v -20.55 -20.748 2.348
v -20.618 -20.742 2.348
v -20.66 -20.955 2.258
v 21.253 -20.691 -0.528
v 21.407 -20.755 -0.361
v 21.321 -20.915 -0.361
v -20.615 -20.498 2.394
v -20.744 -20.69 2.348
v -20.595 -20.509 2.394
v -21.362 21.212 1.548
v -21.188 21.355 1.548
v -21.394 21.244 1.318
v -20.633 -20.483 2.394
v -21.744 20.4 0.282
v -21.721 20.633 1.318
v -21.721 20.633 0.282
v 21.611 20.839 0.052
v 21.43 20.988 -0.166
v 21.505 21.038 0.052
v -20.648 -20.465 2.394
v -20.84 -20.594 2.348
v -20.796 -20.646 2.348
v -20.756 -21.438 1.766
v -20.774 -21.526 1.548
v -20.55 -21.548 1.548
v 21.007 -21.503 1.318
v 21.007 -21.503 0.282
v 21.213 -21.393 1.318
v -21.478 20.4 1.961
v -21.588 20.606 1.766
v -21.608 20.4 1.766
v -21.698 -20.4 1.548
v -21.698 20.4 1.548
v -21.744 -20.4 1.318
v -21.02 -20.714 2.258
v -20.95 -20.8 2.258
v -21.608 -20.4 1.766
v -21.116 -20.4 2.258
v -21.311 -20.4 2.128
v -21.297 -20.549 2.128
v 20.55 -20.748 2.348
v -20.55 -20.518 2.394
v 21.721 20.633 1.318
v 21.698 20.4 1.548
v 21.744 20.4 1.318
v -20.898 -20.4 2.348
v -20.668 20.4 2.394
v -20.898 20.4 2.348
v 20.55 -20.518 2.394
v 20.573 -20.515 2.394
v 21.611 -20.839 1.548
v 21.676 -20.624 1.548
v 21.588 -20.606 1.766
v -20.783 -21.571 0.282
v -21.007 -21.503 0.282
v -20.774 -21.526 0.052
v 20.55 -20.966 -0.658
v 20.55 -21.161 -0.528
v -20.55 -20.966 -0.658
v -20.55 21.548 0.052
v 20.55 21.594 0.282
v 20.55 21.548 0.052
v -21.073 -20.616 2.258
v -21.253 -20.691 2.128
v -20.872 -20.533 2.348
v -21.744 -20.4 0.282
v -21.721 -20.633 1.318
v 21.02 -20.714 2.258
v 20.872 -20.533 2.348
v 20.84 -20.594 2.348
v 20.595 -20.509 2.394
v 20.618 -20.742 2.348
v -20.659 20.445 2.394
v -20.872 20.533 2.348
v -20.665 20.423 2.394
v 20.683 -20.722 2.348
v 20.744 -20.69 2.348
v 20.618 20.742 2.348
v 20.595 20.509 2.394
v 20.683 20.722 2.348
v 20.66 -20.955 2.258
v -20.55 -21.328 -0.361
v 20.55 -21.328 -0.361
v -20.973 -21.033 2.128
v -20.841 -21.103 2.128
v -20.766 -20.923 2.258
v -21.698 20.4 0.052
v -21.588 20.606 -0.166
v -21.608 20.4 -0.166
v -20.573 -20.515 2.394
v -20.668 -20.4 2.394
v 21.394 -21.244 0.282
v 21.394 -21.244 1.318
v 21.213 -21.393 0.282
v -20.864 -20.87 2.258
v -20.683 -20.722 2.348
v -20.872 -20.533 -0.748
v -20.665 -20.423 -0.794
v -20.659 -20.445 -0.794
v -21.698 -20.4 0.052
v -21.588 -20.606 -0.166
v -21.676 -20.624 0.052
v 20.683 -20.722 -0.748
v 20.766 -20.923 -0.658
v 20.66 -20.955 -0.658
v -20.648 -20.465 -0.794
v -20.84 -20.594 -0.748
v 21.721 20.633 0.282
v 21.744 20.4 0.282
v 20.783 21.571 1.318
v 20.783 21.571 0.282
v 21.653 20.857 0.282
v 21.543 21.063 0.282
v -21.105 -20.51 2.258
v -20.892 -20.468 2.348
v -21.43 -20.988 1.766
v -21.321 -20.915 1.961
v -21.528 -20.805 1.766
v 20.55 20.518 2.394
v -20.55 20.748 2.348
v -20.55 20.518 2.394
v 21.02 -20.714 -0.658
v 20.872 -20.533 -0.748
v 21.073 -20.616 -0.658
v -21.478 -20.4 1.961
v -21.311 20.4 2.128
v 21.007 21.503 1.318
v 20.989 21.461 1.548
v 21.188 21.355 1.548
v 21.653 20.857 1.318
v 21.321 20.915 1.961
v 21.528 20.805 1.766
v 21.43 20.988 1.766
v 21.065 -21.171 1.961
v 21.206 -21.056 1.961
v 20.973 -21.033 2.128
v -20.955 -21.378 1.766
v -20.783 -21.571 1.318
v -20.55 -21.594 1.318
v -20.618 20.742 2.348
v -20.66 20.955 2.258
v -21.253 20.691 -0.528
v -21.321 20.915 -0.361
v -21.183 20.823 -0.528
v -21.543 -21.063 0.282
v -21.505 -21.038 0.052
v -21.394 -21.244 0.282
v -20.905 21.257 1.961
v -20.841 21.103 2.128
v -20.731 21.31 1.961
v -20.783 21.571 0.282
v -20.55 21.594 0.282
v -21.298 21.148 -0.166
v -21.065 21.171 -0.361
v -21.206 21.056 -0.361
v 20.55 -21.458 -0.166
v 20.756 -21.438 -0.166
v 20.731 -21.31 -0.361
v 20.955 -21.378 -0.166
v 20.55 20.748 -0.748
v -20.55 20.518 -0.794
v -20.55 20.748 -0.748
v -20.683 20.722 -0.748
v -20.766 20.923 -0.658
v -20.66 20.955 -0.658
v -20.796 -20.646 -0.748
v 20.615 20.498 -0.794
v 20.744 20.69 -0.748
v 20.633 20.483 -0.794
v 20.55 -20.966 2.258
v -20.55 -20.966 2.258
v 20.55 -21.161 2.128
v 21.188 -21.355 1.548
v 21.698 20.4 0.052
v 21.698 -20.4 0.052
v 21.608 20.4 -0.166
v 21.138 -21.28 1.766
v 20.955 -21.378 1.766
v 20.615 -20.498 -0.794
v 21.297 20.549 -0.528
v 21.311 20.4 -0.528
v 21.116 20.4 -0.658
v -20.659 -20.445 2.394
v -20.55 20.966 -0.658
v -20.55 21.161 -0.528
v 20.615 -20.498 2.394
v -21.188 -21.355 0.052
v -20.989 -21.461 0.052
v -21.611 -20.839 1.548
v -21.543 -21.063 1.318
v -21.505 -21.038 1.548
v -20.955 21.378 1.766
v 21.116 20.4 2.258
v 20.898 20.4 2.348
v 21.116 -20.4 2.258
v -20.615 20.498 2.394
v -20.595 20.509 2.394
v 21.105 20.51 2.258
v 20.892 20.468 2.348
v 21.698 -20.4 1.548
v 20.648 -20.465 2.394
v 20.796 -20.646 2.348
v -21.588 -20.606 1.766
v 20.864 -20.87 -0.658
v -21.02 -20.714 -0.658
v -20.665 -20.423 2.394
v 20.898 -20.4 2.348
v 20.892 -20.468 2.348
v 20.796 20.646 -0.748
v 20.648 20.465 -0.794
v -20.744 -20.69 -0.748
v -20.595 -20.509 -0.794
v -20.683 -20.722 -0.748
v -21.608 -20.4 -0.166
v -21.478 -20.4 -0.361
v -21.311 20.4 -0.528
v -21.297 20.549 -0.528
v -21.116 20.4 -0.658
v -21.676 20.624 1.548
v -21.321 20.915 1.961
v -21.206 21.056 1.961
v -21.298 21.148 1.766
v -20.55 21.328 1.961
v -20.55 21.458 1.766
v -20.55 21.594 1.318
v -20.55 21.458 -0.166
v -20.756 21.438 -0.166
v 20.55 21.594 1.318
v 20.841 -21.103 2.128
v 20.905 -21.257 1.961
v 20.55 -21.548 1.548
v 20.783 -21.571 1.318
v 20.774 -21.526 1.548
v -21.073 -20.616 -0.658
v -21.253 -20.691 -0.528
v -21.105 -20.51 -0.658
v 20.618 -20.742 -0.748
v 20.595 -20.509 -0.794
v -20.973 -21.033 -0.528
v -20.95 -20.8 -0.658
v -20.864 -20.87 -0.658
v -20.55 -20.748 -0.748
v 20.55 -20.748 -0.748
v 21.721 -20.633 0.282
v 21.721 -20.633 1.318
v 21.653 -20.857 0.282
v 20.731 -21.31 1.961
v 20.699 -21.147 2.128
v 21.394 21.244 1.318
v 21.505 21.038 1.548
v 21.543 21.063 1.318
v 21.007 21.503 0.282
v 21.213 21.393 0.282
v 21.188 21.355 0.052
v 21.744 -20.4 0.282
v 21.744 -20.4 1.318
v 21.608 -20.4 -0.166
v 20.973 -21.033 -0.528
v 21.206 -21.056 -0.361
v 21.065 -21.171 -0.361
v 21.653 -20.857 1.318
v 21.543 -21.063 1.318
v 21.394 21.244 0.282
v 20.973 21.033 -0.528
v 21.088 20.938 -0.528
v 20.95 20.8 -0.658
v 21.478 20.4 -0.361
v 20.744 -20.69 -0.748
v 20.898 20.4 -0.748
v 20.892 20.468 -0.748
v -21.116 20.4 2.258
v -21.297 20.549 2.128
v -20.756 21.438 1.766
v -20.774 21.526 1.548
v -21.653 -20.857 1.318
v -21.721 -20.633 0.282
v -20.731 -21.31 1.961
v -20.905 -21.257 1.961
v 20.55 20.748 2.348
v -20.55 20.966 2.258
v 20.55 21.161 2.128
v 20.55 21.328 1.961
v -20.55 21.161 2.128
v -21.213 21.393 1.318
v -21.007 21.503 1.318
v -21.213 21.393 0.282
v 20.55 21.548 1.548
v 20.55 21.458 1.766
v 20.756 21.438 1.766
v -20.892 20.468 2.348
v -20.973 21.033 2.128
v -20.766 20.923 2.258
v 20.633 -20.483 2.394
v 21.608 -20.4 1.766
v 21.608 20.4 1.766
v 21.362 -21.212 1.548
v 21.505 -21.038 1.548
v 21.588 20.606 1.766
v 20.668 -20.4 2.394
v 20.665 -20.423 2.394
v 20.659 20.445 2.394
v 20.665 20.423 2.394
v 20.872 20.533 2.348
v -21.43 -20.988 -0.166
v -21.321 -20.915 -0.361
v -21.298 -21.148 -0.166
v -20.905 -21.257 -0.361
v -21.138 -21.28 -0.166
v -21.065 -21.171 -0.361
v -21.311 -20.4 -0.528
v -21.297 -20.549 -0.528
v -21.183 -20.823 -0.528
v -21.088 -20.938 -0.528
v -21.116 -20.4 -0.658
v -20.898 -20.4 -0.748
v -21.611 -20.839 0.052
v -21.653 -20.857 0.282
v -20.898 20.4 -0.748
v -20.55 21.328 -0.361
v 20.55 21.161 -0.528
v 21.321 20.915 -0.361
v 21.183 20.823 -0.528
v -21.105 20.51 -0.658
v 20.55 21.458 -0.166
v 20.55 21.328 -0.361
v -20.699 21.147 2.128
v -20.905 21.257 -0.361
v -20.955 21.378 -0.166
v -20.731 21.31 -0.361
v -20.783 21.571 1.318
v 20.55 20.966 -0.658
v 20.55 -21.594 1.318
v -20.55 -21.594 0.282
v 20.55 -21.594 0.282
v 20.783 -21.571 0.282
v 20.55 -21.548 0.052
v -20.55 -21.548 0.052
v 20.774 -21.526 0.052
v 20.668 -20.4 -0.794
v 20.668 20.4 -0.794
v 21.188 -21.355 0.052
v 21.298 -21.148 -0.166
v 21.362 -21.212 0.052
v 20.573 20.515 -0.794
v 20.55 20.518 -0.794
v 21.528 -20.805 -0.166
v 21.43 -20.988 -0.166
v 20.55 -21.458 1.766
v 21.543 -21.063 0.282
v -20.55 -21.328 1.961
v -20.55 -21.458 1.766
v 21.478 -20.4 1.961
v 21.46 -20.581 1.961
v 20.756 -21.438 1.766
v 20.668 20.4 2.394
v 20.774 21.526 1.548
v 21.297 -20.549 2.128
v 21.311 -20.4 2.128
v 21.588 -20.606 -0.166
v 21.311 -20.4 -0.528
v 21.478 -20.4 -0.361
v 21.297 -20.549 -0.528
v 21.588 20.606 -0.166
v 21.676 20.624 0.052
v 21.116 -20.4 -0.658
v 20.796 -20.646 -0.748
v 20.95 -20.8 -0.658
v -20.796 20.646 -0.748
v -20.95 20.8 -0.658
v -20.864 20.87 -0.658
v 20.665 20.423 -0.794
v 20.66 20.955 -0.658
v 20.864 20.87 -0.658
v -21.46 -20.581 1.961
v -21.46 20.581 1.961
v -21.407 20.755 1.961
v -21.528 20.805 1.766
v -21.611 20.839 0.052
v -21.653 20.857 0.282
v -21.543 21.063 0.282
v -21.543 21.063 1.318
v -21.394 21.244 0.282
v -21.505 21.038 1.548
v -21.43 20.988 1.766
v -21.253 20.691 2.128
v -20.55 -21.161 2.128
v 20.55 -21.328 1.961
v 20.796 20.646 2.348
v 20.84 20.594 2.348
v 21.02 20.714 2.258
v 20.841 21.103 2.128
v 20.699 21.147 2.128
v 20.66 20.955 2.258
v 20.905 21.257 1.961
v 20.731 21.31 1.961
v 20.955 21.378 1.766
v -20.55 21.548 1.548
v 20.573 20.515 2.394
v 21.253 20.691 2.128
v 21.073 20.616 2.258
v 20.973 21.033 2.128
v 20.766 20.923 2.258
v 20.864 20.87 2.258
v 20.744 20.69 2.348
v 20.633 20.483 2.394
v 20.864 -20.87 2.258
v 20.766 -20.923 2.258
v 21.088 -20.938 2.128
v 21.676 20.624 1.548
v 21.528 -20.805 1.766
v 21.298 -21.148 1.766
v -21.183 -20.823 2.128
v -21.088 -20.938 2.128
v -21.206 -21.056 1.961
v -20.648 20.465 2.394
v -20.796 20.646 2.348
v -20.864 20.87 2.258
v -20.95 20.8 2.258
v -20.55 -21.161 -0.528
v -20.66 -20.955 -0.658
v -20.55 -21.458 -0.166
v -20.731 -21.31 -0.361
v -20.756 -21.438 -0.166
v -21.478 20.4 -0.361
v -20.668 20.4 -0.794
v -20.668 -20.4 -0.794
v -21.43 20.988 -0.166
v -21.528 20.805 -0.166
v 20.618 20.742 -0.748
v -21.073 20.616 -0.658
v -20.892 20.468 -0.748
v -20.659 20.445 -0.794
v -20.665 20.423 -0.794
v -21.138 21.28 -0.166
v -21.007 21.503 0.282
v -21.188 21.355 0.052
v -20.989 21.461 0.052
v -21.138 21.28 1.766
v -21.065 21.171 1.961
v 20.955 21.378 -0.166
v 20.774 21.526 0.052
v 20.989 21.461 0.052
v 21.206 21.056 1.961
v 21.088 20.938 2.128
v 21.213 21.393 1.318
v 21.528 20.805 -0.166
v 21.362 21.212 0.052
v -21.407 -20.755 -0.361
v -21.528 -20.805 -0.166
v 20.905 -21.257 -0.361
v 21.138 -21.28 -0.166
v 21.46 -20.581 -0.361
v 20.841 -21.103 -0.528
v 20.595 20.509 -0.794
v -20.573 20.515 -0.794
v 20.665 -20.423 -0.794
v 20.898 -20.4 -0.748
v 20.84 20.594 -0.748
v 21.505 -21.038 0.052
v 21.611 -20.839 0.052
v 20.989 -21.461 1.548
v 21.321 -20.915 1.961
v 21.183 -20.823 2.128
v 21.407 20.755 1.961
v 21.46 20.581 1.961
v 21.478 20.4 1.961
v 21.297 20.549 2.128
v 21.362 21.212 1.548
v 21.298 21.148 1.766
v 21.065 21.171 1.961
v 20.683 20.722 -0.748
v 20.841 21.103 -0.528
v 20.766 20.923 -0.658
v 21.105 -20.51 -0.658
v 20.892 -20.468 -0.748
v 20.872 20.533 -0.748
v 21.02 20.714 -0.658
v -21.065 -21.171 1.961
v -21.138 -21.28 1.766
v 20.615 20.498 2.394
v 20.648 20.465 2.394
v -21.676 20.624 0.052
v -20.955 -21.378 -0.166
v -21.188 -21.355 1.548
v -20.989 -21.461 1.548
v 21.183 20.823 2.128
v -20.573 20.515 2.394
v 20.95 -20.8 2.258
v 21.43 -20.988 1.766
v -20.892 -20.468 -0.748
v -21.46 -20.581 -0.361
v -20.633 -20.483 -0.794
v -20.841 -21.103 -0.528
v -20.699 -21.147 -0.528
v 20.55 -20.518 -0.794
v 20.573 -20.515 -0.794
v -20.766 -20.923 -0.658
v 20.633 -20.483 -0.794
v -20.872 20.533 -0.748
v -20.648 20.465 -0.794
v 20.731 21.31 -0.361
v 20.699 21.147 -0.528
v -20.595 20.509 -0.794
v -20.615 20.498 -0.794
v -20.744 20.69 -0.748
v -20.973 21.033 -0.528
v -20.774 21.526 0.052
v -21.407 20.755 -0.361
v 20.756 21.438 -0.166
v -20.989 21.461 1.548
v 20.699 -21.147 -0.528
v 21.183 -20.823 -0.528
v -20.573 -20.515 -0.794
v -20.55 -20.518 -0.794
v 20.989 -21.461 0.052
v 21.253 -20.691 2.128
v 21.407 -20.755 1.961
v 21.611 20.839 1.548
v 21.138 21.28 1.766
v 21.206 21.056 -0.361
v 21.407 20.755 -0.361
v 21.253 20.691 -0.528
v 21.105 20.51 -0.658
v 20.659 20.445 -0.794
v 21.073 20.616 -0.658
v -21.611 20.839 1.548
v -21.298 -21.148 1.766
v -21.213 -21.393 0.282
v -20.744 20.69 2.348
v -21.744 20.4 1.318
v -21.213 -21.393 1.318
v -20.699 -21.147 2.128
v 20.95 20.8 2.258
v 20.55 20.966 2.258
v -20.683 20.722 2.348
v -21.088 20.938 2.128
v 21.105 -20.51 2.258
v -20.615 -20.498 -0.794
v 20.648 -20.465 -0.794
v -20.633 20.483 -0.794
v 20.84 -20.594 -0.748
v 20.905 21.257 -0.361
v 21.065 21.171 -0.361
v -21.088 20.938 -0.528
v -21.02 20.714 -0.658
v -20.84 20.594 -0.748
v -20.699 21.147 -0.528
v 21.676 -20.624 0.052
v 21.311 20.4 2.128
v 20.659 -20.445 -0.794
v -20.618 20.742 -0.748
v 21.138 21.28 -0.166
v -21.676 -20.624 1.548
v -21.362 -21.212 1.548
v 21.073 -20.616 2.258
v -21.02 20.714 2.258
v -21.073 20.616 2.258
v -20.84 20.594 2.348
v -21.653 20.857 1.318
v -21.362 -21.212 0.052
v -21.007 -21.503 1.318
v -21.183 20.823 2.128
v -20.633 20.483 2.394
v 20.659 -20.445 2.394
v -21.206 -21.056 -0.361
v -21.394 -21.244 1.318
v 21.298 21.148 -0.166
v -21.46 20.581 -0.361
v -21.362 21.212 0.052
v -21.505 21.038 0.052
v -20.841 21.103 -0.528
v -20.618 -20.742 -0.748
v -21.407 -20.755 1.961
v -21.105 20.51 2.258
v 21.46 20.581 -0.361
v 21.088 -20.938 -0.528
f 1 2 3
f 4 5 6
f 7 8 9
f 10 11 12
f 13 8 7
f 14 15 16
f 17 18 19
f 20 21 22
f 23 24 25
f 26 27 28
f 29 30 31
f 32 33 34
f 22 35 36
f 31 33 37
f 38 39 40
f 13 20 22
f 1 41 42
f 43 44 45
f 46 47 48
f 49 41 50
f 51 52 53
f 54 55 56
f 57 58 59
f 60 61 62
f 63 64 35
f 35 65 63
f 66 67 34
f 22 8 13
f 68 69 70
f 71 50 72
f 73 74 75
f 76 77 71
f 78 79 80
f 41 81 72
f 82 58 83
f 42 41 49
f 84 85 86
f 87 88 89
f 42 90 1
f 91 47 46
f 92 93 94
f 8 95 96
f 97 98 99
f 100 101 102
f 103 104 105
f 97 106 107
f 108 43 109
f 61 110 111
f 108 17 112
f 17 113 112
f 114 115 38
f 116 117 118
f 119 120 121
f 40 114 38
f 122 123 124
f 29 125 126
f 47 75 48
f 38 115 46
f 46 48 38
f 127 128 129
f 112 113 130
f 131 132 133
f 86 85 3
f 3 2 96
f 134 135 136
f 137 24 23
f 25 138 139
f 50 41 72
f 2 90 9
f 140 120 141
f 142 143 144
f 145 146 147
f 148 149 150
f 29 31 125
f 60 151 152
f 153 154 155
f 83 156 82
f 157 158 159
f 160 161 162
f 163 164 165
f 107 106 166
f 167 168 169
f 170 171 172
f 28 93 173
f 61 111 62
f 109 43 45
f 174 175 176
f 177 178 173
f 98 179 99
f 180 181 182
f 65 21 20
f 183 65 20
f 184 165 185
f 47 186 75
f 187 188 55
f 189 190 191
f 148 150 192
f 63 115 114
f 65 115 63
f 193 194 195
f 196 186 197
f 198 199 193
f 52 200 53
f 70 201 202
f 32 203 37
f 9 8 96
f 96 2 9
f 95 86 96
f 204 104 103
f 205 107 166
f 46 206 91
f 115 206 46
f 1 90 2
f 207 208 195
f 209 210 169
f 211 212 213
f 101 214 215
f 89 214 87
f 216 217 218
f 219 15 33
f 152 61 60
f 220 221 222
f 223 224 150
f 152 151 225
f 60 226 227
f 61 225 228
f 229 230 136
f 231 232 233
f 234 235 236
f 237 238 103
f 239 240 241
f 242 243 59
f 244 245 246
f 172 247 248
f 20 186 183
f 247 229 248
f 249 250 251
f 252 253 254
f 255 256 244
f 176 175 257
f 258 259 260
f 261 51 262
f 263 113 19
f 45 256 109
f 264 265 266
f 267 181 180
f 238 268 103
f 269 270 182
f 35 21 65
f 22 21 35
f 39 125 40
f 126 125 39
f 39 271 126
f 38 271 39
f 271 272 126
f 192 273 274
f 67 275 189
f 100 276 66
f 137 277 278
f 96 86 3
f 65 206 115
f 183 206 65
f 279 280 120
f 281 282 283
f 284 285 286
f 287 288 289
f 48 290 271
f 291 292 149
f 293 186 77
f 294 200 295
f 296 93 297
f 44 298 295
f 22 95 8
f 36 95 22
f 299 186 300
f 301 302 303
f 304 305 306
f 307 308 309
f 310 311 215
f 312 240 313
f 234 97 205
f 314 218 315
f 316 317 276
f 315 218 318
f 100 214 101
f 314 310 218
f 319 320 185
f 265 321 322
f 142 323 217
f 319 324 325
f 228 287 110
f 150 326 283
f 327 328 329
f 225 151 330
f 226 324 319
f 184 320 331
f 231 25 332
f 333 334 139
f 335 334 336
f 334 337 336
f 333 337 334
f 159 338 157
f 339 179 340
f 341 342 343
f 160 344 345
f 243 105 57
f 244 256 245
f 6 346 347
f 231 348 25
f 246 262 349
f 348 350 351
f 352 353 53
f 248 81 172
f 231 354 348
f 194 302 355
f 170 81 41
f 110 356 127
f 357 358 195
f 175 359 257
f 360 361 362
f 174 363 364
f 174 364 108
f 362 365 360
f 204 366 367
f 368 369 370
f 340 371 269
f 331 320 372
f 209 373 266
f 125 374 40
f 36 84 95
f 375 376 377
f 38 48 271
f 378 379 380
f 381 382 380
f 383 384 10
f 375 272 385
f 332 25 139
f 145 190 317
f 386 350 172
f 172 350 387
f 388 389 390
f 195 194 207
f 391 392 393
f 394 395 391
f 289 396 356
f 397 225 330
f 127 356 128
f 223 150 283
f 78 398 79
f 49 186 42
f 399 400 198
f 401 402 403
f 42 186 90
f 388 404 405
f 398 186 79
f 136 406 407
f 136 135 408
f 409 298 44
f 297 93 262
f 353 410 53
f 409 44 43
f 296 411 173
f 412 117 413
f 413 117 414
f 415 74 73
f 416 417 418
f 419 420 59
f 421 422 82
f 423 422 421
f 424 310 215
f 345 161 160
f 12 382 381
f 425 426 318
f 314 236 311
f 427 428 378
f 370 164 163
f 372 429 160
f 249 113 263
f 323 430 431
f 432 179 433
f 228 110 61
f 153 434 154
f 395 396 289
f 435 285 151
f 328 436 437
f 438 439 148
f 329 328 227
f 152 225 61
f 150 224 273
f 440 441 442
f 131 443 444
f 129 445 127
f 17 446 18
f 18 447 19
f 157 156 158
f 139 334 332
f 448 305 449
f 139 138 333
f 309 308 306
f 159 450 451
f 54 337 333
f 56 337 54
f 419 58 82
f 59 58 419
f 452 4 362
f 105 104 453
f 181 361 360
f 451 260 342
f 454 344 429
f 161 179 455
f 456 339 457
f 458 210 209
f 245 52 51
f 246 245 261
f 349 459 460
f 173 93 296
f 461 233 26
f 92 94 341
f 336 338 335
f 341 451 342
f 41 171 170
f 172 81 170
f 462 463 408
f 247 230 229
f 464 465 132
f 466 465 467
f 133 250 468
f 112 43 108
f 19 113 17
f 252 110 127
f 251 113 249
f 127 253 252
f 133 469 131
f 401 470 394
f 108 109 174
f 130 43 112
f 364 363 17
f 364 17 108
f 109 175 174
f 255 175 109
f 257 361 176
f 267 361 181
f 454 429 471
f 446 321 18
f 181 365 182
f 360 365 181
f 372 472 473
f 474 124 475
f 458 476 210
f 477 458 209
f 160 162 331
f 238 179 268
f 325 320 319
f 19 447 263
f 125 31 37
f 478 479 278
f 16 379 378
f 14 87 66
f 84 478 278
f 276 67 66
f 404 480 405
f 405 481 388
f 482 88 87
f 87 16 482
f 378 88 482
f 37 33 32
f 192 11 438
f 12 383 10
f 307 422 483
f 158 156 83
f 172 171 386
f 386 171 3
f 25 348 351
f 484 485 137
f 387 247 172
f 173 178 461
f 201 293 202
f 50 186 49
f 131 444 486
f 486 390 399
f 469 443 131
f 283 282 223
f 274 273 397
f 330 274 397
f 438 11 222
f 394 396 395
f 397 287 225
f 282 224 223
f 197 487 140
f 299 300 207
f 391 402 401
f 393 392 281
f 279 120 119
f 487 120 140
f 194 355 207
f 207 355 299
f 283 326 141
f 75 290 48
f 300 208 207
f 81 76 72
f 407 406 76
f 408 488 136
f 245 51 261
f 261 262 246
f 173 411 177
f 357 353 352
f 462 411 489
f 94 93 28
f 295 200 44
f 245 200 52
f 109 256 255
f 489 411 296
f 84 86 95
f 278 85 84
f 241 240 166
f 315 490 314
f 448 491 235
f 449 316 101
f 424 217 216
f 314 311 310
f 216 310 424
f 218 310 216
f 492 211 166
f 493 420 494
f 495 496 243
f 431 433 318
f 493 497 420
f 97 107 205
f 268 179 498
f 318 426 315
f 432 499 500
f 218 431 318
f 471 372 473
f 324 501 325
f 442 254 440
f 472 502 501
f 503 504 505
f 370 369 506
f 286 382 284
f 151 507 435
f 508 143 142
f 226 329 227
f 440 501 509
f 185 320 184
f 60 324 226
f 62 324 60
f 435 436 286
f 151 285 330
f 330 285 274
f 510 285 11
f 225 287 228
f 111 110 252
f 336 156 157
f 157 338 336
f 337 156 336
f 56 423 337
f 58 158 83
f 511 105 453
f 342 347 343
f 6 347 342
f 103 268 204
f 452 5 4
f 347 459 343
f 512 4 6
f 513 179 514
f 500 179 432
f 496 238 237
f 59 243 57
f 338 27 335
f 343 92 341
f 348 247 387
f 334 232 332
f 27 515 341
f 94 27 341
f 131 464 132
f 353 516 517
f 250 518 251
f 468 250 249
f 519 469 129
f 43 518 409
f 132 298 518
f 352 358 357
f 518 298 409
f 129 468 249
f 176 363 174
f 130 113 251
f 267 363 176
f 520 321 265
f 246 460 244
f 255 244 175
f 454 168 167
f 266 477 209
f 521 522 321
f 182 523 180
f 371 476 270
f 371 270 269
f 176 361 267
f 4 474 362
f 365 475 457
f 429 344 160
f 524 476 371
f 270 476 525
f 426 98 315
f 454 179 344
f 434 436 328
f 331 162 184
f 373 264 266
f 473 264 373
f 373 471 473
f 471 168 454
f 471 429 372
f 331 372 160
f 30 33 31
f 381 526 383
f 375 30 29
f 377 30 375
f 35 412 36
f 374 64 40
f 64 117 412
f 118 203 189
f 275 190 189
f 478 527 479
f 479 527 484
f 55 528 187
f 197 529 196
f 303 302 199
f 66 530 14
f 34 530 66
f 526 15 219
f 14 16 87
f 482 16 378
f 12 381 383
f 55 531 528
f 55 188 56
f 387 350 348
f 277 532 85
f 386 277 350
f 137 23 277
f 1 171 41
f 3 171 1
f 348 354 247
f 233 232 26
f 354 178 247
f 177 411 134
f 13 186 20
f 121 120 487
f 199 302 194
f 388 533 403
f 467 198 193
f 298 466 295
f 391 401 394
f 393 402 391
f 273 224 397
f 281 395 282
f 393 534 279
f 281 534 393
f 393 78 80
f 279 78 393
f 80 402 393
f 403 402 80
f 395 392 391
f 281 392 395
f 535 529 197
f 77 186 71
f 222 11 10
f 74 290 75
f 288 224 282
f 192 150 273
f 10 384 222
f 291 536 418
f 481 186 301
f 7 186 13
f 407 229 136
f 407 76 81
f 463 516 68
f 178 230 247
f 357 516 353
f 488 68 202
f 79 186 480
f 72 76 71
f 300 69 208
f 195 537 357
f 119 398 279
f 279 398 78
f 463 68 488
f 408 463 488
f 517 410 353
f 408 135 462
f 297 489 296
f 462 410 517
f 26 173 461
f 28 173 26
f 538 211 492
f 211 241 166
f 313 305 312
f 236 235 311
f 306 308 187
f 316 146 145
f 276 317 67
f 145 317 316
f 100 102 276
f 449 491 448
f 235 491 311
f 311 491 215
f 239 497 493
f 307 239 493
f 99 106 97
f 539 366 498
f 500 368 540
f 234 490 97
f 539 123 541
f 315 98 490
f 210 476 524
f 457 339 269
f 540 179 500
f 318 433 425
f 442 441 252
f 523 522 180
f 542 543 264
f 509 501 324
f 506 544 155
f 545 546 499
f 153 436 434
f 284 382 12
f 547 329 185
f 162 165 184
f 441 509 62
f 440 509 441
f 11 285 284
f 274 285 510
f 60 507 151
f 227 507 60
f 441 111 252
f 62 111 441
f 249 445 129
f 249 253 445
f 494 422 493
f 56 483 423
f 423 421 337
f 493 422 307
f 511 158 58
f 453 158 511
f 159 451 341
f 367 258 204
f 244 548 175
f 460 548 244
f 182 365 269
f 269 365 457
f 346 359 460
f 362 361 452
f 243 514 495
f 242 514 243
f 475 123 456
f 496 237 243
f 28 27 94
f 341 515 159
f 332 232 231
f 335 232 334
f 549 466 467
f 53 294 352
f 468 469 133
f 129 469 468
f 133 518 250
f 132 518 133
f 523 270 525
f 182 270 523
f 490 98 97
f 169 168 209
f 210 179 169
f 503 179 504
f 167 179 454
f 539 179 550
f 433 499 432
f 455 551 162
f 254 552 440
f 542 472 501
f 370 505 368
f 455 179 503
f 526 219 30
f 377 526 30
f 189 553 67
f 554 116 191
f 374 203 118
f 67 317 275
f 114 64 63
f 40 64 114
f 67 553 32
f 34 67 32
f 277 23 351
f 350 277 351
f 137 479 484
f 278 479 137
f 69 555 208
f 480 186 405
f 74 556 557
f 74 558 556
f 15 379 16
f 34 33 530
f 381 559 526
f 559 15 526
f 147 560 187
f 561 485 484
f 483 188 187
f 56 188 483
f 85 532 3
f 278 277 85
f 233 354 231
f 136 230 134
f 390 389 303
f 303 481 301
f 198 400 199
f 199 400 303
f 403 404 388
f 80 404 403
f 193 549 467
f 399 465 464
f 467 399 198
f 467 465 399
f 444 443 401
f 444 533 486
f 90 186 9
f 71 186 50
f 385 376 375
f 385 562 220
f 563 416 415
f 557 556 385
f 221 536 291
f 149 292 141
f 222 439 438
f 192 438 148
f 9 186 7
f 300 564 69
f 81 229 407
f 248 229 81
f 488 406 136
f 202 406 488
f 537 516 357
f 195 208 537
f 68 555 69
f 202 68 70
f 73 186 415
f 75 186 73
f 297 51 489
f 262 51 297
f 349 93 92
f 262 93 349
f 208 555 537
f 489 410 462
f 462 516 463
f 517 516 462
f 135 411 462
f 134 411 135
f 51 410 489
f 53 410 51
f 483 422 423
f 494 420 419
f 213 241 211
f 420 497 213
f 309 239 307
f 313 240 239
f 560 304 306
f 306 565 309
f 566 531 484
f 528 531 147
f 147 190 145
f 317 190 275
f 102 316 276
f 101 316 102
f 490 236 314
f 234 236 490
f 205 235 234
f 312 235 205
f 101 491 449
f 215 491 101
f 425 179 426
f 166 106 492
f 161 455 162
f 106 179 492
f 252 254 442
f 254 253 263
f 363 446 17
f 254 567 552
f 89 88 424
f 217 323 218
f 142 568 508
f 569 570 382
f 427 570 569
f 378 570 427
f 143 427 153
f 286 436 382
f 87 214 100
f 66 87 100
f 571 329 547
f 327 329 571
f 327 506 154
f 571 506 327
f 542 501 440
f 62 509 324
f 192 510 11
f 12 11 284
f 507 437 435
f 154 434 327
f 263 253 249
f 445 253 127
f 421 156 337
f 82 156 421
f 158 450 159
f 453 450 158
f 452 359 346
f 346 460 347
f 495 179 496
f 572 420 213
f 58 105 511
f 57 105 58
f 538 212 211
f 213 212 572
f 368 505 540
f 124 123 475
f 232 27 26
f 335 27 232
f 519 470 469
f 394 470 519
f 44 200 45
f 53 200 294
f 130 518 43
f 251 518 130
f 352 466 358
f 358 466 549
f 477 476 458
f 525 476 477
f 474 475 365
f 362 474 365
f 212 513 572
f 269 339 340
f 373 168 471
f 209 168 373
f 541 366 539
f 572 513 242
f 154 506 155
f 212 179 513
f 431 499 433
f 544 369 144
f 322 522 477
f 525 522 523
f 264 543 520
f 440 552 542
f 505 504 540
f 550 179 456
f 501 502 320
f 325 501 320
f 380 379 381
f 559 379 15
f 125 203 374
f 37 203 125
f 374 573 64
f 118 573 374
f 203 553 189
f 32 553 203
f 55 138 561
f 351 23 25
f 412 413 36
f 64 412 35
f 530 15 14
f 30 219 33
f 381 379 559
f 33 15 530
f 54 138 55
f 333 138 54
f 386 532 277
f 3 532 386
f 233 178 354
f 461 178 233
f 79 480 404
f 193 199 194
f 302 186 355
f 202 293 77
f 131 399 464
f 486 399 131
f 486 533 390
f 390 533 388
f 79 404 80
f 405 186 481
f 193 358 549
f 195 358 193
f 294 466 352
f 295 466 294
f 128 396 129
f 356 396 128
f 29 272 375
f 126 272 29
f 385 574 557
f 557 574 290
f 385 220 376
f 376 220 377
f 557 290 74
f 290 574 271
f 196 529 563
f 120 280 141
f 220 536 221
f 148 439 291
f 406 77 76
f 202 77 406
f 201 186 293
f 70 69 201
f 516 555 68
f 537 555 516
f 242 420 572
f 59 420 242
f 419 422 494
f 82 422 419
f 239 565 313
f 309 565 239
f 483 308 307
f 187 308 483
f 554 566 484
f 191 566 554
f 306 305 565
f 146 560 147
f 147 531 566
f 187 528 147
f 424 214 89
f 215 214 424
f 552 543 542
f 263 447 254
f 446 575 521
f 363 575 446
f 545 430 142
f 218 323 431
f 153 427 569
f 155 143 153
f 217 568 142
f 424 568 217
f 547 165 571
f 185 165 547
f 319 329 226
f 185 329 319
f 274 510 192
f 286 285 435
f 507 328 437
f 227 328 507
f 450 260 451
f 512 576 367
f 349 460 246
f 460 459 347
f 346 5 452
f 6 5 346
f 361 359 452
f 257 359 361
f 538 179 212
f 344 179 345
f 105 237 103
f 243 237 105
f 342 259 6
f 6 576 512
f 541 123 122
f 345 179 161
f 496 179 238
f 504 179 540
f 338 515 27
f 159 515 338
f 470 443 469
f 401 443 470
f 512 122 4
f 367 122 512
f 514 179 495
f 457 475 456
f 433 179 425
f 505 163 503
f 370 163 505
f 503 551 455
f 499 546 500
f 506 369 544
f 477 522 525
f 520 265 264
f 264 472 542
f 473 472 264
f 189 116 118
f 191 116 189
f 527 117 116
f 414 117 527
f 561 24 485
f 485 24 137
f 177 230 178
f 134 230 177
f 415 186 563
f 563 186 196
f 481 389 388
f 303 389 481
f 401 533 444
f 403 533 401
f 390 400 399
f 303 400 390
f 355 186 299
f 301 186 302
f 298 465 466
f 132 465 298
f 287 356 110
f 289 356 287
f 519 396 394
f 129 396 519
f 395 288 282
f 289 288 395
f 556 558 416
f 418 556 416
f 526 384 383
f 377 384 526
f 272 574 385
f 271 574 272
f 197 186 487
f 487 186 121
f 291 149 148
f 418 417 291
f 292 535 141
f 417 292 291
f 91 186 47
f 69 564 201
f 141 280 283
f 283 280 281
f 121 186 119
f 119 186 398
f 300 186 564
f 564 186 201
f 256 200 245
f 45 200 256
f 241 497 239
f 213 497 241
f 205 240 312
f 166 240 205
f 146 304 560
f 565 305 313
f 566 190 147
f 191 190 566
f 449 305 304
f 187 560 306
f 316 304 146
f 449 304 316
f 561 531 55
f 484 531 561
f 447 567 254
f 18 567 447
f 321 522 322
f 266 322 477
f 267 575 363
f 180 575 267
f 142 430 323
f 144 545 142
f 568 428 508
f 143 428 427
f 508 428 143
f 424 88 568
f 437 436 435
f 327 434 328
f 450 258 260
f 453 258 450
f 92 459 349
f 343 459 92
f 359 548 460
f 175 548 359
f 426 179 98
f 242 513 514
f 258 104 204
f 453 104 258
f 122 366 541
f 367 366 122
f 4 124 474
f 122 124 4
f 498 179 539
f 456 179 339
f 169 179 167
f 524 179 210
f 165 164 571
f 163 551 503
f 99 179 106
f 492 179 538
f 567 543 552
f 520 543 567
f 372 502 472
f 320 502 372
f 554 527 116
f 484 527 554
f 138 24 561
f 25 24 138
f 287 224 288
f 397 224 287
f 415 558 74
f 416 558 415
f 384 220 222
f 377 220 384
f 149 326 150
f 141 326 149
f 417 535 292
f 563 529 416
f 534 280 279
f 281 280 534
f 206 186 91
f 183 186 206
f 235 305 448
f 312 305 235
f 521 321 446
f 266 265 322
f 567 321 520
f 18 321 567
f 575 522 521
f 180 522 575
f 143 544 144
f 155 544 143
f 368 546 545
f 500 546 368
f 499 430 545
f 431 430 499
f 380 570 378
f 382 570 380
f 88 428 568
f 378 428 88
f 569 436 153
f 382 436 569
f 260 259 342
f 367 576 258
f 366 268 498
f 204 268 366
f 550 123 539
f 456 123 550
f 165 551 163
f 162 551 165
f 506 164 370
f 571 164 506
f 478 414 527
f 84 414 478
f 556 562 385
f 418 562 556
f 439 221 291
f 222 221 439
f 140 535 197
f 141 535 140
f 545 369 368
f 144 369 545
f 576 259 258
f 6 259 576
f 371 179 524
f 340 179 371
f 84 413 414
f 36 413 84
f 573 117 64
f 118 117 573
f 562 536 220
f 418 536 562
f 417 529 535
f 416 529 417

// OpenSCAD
// L298N (L298N 馬達驅動板) visual source for NexCAD.
// Units: millimeters. Origin: part bottom-center, matching src/parts/library.ts.
// This generated baseline is intentionally simple; refine it with measured details before exporting STL.

$fn = 32;

module rounded_box(size, r = 0.8) {
  hull() {
    for (x = [-size[0] / 2 + r, size[0] / 2 - r])
      for (y = [-size[1] / 2 + r, size[1] / 2 - r]) {
        translate([x, y, r]) sphere(r = r);
        translate([x, y, size[2] - r]) sphere(r = r);
      }
  }
}

color("#2e7d5b") rounded_box([43.5, 43.2, 1.6], min(1.2, min(43.5, 43.2) / 8));
